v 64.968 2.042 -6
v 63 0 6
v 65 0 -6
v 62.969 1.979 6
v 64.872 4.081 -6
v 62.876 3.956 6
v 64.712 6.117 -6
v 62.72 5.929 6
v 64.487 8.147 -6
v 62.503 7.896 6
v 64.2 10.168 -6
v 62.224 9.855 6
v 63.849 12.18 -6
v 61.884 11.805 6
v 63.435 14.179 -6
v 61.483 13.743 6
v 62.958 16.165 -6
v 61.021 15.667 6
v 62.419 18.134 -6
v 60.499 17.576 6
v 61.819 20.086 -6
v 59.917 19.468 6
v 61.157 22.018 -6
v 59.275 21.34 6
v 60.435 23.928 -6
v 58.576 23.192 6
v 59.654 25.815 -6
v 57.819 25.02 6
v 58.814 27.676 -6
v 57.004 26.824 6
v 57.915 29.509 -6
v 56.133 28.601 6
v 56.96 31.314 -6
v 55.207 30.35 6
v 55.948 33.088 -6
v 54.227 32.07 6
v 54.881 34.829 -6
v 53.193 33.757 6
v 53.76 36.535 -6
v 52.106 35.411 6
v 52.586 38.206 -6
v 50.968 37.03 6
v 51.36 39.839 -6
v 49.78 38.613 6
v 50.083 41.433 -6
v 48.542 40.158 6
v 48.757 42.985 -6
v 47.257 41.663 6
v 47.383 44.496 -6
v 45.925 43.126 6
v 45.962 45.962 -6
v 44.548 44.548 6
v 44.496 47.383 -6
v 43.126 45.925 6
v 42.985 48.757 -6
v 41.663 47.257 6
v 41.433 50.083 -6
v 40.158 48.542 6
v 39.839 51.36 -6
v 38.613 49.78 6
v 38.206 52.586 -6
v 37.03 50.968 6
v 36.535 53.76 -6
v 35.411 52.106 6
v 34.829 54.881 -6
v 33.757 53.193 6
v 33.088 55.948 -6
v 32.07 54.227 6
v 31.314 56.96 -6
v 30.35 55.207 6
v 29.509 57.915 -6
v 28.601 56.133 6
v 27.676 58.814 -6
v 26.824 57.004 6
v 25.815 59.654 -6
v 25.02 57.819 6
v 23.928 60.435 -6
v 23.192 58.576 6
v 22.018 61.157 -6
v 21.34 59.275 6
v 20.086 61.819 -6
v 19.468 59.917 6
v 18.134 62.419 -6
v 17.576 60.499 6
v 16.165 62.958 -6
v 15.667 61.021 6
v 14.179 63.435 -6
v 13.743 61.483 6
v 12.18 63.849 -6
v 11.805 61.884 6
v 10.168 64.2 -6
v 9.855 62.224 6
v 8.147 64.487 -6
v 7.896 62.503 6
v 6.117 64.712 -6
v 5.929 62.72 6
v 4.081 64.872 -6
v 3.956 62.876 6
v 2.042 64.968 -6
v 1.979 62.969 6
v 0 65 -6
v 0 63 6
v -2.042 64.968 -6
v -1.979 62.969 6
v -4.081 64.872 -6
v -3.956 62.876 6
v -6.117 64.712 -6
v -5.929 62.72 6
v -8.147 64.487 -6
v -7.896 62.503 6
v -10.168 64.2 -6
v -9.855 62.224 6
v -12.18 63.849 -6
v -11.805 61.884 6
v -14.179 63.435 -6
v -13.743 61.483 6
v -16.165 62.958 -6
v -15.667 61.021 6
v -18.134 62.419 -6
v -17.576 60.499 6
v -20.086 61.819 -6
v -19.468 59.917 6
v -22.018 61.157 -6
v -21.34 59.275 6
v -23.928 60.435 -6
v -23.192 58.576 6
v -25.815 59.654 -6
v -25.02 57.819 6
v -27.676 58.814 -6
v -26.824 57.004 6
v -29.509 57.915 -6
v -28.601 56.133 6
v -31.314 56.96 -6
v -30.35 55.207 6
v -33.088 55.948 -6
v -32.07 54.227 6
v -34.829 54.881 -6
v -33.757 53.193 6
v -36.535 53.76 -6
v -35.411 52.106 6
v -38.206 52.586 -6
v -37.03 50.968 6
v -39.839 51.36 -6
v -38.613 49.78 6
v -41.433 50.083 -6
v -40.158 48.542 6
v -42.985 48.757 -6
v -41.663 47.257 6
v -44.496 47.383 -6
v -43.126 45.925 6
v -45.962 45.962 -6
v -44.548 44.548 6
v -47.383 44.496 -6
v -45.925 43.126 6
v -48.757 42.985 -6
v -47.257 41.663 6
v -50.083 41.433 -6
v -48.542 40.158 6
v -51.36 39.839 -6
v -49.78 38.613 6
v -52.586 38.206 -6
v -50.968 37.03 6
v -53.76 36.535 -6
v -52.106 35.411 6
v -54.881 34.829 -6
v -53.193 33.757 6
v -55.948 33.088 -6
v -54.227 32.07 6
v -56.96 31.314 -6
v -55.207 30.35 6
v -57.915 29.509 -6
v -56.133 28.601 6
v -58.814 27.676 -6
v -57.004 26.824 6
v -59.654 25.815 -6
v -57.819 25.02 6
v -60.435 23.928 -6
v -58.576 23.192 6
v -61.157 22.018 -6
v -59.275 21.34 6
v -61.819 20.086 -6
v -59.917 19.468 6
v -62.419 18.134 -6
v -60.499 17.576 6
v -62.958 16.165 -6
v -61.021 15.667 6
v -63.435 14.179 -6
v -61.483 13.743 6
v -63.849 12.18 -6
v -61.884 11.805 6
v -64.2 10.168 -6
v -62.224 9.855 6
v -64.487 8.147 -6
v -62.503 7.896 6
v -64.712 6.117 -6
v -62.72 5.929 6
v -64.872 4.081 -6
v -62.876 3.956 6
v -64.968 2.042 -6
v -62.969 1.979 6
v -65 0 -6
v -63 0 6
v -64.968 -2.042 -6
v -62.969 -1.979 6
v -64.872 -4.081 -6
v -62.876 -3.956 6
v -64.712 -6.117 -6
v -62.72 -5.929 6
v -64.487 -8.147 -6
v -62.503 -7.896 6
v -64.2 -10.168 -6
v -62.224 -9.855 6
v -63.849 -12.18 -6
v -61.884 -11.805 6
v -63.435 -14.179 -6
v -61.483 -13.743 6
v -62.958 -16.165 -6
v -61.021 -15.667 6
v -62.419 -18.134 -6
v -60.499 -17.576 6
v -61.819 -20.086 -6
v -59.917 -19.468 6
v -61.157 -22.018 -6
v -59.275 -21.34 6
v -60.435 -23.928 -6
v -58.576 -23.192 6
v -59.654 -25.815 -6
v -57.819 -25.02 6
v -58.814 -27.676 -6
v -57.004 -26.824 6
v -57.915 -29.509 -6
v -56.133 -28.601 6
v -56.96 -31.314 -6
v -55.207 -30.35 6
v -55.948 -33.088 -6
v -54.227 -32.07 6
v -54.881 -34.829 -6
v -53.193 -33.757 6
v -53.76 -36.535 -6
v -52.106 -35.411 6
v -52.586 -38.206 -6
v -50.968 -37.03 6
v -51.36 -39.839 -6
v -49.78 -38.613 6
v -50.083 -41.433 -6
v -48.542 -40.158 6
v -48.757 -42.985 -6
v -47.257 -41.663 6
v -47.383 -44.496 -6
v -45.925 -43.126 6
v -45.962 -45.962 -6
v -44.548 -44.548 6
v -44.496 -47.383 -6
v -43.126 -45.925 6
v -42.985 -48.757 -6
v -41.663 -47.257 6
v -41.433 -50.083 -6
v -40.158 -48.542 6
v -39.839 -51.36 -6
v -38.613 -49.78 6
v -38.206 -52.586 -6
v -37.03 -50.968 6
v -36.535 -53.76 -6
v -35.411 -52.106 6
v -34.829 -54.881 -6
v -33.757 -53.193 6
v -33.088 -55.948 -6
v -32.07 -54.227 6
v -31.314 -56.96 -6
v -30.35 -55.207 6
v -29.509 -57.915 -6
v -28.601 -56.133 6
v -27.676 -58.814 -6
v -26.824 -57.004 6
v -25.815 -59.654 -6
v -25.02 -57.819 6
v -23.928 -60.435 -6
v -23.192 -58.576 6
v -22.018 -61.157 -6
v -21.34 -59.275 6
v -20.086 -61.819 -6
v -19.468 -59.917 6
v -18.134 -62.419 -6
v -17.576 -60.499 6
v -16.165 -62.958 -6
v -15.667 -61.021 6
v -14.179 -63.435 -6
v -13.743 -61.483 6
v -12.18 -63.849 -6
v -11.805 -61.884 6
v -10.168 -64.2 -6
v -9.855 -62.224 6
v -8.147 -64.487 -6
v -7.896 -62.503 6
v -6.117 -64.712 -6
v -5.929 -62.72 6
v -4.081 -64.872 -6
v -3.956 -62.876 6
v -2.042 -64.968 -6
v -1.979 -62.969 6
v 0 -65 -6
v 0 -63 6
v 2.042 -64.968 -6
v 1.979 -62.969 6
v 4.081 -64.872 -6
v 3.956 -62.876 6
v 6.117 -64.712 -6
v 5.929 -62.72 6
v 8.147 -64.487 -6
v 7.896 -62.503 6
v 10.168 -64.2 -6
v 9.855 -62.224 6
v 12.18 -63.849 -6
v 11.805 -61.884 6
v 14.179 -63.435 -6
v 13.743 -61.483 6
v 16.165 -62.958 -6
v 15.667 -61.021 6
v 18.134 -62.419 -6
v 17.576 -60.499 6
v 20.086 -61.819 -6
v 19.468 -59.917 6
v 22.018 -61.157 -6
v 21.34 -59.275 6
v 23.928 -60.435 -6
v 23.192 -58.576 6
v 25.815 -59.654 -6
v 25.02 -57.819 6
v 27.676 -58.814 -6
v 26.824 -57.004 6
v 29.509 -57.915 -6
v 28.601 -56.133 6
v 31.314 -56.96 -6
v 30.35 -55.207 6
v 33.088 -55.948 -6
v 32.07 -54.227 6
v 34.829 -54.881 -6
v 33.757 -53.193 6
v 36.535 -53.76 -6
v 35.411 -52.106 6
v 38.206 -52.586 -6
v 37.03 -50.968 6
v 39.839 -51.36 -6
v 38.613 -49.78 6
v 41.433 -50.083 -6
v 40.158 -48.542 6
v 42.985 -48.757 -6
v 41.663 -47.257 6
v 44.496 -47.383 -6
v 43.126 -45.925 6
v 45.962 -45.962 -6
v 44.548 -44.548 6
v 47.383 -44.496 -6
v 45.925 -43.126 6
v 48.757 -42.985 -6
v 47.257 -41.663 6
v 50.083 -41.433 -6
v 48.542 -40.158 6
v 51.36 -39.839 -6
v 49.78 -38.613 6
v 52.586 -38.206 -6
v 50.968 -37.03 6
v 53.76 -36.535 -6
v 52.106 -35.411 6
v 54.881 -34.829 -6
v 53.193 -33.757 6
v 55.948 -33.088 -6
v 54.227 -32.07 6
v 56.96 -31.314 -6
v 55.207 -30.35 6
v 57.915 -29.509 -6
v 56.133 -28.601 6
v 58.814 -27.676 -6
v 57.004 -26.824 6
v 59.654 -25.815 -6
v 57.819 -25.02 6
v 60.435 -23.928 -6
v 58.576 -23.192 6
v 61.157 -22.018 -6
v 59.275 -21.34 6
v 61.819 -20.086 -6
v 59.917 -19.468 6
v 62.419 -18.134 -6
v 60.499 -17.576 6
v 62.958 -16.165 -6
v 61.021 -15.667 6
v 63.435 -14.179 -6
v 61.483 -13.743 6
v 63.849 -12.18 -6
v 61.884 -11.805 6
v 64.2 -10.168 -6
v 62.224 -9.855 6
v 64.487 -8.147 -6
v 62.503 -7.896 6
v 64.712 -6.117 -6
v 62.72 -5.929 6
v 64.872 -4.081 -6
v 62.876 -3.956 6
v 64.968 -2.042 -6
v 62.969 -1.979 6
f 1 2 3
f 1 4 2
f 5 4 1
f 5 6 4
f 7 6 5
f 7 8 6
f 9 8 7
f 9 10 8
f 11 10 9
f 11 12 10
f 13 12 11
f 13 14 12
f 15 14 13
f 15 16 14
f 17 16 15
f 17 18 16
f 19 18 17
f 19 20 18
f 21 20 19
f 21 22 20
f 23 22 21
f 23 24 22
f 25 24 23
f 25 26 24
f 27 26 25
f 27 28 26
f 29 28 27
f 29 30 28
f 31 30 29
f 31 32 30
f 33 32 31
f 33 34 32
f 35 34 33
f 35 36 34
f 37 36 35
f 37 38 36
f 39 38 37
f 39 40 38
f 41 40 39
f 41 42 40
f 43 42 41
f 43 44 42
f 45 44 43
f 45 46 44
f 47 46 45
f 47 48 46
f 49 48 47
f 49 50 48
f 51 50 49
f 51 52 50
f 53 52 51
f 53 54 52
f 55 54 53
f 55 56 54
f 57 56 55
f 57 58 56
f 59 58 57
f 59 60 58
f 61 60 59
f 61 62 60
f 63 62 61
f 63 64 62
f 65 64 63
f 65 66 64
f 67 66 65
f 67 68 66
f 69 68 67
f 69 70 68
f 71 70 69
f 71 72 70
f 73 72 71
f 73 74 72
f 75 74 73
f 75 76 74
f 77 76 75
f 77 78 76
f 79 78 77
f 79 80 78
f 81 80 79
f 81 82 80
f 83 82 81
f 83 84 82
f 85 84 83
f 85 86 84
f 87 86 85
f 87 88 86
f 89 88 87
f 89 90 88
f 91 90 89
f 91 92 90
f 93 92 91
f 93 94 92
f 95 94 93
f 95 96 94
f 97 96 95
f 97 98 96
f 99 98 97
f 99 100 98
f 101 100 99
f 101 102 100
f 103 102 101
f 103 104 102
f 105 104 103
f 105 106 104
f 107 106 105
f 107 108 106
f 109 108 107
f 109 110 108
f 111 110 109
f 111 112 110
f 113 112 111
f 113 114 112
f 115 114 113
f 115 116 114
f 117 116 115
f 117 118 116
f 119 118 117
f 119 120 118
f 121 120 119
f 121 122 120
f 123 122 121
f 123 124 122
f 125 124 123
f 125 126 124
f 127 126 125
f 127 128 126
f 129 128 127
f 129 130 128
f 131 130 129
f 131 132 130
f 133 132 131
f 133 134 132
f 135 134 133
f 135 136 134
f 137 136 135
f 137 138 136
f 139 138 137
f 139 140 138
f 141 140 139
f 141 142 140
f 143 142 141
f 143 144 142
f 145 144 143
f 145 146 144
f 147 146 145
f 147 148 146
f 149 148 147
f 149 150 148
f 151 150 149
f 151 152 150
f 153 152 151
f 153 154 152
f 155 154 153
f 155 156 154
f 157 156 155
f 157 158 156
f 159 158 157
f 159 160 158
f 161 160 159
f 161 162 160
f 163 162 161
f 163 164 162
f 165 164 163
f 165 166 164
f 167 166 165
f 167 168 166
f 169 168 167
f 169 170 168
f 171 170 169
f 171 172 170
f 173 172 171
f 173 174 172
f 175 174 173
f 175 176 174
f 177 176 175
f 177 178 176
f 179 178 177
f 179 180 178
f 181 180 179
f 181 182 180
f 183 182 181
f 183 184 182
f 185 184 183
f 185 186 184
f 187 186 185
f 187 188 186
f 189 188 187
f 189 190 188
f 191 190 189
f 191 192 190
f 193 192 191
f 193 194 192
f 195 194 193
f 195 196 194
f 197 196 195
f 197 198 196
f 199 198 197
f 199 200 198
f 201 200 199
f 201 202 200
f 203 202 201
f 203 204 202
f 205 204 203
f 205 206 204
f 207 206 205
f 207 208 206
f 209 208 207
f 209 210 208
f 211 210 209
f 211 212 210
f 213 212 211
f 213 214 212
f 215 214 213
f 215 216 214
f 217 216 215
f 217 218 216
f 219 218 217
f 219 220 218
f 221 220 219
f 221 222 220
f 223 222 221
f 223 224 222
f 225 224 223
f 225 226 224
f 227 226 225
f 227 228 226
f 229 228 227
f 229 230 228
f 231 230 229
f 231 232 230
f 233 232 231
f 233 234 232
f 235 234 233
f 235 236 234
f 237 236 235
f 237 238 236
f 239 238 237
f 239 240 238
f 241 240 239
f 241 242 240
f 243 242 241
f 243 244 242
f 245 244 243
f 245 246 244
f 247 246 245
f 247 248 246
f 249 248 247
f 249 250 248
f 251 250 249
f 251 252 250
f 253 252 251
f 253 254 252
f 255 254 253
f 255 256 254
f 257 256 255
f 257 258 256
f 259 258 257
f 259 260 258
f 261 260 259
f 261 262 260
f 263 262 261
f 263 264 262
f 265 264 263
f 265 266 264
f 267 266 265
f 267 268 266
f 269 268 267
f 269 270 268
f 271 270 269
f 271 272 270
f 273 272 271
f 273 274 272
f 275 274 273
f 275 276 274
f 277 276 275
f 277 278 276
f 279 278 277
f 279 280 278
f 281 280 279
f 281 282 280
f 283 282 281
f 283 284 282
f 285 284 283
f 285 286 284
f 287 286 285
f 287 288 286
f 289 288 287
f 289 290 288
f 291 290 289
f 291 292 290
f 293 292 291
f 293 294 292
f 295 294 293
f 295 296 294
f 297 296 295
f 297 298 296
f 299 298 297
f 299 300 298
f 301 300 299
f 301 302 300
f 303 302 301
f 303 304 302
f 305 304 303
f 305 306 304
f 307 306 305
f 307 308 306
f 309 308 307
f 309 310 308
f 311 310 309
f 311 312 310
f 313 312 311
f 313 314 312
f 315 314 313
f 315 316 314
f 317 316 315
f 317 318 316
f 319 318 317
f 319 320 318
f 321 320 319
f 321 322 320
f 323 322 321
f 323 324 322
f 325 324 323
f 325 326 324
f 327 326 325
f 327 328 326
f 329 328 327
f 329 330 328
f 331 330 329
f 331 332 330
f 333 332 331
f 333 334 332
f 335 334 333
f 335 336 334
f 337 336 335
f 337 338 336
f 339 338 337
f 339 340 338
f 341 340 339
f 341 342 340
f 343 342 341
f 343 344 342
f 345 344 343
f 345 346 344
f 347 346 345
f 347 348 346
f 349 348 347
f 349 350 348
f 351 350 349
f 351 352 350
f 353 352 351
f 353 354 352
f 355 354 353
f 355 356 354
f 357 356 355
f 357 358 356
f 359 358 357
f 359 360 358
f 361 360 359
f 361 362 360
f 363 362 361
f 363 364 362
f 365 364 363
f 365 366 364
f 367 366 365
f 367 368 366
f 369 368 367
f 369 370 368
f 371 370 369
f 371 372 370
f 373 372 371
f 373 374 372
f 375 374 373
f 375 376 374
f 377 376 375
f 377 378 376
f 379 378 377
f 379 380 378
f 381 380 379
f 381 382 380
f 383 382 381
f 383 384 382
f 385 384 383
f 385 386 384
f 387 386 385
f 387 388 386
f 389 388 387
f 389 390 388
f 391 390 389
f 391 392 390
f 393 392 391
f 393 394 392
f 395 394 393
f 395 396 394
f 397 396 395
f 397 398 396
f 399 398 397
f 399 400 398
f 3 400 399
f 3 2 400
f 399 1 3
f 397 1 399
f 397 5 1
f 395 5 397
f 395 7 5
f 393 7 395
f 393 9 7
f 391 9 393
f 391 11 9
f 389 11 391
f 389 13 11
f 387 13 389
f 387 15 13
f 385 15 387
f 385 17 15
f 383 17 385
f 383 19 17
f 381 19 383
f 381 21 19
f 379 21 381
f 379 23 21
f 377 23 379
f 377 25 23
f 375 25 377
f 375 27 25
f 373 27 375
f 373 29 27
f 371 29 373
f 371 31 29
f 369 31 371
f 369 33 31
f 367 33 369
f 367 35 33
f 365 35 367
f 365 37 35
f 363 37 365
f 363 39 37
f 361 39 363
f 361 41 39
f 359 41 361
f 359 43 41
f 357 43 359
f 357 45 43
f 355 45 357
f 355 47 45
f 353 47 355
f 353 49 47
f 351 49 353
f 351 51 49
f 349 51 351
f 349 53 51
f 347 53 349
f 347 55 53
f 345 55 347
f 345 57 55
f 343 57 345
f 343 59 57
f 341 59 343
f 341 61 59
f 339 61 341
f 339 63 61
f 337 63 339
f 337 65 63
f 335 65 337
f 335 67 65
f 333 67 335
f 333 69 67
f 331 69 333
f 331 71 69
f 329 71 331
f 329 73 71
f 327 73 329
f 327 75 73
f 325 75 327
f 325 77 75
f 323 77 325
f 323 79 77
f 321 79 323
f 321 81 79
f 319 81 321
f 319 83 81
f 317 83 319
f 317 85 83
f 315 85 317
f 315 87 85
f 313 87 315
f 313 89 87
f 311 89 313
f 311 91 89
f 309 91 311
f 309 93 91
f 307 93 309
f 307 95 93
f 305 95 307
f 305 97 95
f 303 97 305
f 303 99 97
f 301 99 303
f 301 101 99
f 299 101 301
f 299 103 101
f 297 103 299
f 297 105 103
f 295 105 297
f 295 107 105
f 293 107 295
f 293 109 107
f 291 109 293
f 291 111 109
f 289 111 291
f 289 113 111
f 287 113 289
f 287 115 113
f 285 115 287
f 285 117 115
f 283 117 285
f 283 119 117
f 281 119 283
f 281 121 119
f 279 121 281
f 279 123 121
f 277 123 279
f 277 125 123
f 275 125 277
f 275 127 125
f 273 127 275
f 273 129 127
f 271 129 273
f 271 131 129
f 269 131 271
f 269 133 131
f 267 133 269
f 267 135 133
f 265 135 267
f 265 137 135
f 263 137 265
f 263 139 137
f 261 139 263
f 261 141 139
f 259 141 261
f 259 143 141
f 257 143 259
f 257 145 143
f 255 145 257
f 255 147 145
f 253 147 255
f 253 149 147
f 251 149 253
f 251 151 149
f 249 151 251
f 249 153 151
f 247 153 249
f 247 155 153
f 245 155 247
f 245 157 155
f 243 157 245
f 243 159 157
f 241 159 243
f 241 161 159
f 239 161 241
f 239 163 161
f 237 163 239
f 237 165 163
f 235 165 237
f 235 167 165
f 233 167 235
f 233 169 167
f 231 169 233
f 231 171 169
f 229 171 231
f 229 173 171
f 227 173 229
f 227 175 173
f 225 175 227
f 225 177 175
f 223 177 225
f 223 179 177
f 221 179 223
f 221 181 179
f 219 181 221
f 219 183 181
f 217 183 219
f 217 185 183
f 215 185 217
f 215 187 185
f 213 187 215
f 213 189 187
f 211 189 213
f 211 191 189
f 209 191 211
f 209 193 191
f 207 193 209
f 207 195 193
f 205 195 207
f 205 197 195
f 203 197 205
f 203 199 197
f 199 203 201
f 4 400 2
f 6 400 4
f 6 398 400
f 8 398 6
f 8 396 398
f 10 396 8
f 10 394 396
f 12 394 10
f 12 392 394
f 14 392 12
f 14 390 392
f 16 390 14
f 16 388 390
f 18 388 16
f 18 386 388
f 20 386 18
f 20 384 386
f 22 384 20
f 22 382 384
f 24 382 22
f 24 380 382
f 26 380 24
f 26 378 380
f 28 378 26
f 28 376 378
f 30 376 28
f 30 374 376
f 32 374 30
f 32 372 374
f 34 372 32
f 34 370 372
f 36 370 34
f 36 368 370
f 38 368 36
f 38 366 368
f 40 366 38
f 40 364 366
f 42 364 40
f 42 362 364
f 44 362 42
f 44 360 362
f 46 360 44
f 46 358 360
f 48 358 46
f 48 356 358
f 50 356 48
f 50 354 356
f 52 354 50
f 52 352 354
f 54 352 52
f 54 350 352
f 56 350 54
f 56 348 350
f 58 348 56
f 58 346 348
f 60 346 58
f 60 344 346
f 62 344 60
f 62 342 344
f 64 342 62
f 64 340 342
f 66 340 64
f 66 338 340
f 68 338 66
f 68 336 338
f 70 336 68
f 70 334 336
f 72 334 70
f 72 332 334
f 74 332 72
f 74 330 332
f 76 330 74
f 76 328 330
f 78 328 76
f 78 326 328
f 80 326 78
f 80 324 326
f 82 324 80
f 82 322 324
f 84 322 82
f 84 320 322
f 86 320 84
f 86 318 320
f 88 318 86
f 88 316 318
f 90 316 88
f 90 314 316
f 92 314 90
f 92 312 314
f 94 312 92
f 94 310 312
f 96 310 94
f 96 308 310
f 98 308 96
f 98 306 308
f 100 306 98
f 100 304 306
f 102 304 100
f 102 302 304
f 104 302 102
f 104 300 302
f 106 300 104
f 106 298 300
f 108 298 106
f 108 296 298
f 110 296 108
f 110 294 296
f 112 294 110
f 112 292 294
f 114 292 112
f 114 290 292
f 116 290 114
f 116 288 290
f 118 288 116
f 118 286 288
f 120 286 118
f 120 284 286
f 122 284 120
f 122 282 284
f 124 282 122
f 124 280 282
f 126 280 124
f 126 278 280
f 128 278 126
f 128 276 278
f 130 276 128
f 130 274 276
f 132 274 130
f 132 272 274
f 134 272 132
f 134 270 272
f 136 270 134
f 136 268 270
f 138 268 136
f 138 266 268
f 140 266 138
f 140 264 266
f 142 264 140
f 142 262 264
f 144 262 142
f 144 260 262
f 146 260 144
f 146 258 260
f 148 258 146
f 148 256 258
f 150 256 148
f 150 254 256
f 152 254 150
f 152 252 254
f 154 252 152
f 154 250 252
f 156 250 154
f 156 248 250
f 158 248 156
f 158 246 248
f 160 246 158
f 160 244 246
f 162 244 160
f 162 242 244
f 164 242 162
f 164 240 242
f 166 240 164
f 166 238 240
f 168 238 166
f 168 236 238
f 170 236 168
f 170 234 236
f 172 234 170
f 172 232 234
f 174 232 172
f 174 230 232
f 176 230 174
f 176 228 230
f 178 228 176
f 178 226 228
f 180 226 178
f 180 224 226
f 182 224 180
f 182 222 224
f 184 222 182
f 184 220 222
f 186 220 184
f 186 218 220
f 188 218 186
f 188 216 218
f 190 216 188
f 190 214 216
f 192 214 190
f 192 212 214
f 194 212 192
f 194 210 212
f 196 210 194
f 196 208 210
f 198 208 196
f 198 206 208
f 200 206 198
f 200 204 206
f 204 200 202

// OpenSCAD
// first print r1=61 r2=59
//True measure is D= 128-129; r=64
$fn= 200;
cylinder(h=12, r1=65, r2=63, center=true);
